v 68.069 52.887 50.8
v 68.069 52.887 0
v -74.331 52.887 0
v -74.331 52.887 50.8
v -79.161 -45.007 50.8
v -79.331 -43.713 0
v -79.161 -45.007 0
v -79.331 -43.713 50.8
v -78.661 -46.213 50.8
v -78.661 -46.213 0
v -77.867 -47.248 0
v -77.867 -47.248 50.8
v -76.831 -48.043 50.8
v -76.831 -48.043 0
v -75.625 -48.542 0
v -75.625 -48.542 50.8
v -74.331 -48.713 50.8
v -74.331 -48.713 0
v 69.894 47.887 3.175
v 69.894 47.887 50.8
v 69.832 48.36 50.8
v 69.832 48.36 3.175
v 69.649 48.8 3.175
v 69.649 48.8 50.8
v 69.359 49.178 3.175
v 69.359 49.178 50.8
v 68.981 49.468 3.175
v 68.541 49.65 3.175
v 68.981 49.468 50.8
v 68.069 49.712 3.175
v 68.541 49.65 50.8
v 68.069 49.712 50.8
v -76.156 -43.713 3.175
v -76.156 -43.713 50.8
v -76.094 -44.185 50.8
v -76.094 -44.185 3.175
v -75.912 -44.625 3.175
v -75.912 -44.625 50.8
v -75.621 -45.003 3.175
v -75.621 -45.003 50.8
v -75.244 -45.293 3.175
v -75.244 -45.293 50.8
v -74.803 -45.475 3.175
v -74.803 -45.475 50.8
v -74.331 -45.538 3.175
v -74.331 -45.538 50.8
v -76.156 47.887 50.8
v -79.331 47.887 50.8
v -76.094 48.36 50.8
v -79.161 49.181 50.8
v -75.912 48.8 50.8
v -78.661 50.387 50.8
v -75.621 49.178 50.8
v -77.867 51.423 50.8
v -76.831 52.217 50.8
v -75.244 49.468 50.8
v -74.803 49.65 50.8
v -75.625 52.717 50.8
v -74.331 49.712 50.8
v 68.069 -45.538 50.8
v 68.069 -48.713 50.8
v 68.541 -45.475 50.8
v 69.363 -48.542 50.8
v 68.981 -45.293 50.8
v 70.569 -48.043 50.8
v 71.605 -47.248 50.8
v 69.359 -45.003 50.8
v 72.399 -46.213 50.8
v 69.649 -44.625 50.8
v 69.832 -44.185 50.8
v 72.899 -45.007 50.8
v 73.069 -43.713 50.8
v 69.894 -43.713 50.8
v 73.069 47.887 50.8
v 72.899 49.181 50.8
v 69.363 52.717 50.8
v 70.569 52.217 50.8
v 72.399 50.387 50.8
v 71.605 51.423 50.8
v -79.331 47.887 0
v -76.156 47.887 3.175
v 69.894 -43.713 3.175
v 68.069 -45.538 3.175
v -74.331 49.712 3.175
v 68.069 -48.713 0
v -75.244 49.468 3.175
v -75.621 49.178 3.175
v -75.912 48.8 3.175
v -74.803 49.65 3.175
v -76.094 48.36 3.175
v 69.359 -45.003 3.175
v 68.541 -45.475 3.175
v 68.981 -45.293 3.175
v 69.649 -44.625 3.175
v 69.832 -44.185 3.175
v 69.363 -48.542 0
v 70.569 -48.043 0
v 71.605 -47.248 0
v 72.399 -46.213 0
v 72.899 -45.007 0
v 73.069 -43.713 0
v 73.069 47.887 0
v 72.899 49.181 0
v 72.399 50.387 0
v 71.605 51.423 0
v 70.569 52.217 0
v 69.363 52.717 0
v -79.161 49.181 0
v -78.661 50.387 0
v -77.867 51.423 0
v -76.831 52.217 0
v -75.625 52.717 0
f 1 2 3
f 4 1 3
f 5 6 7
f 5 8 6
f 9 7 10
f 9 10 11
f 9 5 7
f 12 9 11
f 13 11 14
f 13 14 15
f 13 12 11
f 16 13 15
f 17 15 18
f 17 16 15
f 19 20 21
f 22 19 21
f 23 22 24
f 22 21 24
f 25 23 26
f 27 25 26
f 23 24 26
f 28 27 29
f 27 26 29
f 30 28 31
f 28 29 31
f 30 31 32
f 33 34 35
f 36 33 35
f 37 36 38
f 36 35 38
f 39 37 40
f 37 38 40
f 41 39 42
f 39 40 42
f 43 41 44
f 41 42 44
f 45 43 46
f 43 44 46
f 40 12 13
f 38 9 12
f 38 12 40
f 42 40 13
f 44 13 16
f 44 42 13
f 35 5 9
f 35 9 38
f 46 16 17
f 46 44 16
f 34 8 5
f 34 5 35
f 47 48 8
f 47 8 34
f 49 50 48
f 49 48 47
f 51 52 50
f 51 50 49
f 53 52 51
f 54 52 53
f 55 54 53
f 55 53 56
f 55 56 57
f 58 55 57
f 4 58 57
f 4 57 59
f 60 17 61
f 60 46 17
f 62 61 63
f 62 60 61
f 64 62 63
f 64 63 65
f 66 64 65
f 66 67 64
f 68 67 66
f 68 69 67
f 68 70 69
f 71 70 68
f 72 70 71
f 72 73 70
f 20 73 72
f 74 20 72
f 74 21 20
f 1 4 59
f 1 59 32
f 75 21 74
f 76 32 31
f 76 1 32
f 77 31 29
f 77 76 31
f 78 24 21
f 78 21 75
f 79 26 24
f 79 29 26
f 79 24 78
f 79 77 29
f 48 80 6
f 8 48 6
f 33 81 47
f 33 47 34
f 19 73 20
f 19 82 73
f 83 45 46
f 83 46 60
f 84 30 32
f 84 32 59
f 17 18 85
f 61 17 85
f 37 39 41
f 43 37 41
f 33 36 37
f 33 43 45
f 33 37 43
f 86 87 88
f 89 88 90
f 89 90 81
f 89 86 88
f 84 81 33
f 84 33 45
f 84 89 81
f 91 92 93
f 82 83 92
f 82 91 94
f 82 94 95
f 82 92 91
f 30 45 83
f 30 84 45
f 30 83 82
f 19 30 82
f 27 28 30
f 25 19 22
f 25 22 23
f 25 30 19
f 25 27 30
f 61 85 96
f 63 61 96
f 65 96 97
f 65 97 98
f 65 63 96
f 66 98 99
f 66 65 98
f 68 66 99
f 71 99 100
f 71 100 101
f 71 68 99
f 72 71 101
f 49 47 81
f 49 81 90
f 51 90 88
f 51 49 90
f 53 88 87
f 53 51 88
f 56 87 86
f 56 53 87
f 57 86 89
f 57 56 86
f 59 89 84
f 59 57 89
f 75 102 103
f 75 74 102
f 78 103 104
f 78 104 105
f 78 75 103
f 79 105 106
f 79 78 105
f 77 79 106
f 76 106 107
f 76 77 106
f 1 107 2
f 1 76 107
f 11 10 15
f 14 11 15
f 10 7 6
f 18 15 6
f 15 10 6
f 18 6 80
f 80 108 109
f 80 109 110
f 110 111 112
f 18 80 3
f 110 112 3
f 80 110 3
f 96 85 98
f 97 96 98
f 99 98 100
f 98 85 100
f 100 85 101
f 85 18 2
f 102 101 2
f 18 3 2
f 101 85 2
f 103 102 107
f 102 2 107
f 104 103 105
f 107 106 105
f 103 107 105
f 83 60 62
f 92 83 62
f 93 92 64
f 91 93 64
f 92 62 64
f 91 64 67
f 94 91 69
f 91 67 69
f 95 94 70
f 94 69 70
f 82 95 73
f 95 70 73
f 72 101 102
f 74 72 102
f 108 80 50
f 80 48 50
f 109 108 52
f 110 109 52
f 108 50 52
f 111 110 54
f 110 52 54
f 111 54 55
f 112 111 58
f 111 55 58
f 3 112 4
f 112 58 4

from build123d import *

# Parameters (mm, degrees)
F1_DEPTH = 50.8
F2_R     = 5
F3_T     = -3.175


with BuildPart() as f1:
    # F0 (on Top) → F1 (new body)
    with BuildSketch(Plane.XY):
        Polygon((73.068974, -48.712649), (-79.331026, 52.887351), (-79.331026, -48.712649), align=None)
        Polygon((73.068974, 52.887351), (-79.331026, 52.887351), (73.068974, -48.712649), align=None)
    extrude(amount=F1_DEPTH)

    # F2
    f2_edges = [f1.edges().sort_by_distance(p)[0] for p in [
        (-79.331026, -48.712649, 25.4),
        (73.068974, -48.712649, 25.4),
        (73.068974, 52.887351, 25.4),
        (-79.331026, 52.887351, 25.4),
    ]]
    fillet(f2_edges, radius=F2_R)

    # F3
    f3_openings = [f1.faces().sort_by_distance(p)[0] for p in [
        (-3.131026, 2.087351, 50.8),
    ]]
    offset(amount=F3_T, openings=f3_openings)


solid = f1.part
